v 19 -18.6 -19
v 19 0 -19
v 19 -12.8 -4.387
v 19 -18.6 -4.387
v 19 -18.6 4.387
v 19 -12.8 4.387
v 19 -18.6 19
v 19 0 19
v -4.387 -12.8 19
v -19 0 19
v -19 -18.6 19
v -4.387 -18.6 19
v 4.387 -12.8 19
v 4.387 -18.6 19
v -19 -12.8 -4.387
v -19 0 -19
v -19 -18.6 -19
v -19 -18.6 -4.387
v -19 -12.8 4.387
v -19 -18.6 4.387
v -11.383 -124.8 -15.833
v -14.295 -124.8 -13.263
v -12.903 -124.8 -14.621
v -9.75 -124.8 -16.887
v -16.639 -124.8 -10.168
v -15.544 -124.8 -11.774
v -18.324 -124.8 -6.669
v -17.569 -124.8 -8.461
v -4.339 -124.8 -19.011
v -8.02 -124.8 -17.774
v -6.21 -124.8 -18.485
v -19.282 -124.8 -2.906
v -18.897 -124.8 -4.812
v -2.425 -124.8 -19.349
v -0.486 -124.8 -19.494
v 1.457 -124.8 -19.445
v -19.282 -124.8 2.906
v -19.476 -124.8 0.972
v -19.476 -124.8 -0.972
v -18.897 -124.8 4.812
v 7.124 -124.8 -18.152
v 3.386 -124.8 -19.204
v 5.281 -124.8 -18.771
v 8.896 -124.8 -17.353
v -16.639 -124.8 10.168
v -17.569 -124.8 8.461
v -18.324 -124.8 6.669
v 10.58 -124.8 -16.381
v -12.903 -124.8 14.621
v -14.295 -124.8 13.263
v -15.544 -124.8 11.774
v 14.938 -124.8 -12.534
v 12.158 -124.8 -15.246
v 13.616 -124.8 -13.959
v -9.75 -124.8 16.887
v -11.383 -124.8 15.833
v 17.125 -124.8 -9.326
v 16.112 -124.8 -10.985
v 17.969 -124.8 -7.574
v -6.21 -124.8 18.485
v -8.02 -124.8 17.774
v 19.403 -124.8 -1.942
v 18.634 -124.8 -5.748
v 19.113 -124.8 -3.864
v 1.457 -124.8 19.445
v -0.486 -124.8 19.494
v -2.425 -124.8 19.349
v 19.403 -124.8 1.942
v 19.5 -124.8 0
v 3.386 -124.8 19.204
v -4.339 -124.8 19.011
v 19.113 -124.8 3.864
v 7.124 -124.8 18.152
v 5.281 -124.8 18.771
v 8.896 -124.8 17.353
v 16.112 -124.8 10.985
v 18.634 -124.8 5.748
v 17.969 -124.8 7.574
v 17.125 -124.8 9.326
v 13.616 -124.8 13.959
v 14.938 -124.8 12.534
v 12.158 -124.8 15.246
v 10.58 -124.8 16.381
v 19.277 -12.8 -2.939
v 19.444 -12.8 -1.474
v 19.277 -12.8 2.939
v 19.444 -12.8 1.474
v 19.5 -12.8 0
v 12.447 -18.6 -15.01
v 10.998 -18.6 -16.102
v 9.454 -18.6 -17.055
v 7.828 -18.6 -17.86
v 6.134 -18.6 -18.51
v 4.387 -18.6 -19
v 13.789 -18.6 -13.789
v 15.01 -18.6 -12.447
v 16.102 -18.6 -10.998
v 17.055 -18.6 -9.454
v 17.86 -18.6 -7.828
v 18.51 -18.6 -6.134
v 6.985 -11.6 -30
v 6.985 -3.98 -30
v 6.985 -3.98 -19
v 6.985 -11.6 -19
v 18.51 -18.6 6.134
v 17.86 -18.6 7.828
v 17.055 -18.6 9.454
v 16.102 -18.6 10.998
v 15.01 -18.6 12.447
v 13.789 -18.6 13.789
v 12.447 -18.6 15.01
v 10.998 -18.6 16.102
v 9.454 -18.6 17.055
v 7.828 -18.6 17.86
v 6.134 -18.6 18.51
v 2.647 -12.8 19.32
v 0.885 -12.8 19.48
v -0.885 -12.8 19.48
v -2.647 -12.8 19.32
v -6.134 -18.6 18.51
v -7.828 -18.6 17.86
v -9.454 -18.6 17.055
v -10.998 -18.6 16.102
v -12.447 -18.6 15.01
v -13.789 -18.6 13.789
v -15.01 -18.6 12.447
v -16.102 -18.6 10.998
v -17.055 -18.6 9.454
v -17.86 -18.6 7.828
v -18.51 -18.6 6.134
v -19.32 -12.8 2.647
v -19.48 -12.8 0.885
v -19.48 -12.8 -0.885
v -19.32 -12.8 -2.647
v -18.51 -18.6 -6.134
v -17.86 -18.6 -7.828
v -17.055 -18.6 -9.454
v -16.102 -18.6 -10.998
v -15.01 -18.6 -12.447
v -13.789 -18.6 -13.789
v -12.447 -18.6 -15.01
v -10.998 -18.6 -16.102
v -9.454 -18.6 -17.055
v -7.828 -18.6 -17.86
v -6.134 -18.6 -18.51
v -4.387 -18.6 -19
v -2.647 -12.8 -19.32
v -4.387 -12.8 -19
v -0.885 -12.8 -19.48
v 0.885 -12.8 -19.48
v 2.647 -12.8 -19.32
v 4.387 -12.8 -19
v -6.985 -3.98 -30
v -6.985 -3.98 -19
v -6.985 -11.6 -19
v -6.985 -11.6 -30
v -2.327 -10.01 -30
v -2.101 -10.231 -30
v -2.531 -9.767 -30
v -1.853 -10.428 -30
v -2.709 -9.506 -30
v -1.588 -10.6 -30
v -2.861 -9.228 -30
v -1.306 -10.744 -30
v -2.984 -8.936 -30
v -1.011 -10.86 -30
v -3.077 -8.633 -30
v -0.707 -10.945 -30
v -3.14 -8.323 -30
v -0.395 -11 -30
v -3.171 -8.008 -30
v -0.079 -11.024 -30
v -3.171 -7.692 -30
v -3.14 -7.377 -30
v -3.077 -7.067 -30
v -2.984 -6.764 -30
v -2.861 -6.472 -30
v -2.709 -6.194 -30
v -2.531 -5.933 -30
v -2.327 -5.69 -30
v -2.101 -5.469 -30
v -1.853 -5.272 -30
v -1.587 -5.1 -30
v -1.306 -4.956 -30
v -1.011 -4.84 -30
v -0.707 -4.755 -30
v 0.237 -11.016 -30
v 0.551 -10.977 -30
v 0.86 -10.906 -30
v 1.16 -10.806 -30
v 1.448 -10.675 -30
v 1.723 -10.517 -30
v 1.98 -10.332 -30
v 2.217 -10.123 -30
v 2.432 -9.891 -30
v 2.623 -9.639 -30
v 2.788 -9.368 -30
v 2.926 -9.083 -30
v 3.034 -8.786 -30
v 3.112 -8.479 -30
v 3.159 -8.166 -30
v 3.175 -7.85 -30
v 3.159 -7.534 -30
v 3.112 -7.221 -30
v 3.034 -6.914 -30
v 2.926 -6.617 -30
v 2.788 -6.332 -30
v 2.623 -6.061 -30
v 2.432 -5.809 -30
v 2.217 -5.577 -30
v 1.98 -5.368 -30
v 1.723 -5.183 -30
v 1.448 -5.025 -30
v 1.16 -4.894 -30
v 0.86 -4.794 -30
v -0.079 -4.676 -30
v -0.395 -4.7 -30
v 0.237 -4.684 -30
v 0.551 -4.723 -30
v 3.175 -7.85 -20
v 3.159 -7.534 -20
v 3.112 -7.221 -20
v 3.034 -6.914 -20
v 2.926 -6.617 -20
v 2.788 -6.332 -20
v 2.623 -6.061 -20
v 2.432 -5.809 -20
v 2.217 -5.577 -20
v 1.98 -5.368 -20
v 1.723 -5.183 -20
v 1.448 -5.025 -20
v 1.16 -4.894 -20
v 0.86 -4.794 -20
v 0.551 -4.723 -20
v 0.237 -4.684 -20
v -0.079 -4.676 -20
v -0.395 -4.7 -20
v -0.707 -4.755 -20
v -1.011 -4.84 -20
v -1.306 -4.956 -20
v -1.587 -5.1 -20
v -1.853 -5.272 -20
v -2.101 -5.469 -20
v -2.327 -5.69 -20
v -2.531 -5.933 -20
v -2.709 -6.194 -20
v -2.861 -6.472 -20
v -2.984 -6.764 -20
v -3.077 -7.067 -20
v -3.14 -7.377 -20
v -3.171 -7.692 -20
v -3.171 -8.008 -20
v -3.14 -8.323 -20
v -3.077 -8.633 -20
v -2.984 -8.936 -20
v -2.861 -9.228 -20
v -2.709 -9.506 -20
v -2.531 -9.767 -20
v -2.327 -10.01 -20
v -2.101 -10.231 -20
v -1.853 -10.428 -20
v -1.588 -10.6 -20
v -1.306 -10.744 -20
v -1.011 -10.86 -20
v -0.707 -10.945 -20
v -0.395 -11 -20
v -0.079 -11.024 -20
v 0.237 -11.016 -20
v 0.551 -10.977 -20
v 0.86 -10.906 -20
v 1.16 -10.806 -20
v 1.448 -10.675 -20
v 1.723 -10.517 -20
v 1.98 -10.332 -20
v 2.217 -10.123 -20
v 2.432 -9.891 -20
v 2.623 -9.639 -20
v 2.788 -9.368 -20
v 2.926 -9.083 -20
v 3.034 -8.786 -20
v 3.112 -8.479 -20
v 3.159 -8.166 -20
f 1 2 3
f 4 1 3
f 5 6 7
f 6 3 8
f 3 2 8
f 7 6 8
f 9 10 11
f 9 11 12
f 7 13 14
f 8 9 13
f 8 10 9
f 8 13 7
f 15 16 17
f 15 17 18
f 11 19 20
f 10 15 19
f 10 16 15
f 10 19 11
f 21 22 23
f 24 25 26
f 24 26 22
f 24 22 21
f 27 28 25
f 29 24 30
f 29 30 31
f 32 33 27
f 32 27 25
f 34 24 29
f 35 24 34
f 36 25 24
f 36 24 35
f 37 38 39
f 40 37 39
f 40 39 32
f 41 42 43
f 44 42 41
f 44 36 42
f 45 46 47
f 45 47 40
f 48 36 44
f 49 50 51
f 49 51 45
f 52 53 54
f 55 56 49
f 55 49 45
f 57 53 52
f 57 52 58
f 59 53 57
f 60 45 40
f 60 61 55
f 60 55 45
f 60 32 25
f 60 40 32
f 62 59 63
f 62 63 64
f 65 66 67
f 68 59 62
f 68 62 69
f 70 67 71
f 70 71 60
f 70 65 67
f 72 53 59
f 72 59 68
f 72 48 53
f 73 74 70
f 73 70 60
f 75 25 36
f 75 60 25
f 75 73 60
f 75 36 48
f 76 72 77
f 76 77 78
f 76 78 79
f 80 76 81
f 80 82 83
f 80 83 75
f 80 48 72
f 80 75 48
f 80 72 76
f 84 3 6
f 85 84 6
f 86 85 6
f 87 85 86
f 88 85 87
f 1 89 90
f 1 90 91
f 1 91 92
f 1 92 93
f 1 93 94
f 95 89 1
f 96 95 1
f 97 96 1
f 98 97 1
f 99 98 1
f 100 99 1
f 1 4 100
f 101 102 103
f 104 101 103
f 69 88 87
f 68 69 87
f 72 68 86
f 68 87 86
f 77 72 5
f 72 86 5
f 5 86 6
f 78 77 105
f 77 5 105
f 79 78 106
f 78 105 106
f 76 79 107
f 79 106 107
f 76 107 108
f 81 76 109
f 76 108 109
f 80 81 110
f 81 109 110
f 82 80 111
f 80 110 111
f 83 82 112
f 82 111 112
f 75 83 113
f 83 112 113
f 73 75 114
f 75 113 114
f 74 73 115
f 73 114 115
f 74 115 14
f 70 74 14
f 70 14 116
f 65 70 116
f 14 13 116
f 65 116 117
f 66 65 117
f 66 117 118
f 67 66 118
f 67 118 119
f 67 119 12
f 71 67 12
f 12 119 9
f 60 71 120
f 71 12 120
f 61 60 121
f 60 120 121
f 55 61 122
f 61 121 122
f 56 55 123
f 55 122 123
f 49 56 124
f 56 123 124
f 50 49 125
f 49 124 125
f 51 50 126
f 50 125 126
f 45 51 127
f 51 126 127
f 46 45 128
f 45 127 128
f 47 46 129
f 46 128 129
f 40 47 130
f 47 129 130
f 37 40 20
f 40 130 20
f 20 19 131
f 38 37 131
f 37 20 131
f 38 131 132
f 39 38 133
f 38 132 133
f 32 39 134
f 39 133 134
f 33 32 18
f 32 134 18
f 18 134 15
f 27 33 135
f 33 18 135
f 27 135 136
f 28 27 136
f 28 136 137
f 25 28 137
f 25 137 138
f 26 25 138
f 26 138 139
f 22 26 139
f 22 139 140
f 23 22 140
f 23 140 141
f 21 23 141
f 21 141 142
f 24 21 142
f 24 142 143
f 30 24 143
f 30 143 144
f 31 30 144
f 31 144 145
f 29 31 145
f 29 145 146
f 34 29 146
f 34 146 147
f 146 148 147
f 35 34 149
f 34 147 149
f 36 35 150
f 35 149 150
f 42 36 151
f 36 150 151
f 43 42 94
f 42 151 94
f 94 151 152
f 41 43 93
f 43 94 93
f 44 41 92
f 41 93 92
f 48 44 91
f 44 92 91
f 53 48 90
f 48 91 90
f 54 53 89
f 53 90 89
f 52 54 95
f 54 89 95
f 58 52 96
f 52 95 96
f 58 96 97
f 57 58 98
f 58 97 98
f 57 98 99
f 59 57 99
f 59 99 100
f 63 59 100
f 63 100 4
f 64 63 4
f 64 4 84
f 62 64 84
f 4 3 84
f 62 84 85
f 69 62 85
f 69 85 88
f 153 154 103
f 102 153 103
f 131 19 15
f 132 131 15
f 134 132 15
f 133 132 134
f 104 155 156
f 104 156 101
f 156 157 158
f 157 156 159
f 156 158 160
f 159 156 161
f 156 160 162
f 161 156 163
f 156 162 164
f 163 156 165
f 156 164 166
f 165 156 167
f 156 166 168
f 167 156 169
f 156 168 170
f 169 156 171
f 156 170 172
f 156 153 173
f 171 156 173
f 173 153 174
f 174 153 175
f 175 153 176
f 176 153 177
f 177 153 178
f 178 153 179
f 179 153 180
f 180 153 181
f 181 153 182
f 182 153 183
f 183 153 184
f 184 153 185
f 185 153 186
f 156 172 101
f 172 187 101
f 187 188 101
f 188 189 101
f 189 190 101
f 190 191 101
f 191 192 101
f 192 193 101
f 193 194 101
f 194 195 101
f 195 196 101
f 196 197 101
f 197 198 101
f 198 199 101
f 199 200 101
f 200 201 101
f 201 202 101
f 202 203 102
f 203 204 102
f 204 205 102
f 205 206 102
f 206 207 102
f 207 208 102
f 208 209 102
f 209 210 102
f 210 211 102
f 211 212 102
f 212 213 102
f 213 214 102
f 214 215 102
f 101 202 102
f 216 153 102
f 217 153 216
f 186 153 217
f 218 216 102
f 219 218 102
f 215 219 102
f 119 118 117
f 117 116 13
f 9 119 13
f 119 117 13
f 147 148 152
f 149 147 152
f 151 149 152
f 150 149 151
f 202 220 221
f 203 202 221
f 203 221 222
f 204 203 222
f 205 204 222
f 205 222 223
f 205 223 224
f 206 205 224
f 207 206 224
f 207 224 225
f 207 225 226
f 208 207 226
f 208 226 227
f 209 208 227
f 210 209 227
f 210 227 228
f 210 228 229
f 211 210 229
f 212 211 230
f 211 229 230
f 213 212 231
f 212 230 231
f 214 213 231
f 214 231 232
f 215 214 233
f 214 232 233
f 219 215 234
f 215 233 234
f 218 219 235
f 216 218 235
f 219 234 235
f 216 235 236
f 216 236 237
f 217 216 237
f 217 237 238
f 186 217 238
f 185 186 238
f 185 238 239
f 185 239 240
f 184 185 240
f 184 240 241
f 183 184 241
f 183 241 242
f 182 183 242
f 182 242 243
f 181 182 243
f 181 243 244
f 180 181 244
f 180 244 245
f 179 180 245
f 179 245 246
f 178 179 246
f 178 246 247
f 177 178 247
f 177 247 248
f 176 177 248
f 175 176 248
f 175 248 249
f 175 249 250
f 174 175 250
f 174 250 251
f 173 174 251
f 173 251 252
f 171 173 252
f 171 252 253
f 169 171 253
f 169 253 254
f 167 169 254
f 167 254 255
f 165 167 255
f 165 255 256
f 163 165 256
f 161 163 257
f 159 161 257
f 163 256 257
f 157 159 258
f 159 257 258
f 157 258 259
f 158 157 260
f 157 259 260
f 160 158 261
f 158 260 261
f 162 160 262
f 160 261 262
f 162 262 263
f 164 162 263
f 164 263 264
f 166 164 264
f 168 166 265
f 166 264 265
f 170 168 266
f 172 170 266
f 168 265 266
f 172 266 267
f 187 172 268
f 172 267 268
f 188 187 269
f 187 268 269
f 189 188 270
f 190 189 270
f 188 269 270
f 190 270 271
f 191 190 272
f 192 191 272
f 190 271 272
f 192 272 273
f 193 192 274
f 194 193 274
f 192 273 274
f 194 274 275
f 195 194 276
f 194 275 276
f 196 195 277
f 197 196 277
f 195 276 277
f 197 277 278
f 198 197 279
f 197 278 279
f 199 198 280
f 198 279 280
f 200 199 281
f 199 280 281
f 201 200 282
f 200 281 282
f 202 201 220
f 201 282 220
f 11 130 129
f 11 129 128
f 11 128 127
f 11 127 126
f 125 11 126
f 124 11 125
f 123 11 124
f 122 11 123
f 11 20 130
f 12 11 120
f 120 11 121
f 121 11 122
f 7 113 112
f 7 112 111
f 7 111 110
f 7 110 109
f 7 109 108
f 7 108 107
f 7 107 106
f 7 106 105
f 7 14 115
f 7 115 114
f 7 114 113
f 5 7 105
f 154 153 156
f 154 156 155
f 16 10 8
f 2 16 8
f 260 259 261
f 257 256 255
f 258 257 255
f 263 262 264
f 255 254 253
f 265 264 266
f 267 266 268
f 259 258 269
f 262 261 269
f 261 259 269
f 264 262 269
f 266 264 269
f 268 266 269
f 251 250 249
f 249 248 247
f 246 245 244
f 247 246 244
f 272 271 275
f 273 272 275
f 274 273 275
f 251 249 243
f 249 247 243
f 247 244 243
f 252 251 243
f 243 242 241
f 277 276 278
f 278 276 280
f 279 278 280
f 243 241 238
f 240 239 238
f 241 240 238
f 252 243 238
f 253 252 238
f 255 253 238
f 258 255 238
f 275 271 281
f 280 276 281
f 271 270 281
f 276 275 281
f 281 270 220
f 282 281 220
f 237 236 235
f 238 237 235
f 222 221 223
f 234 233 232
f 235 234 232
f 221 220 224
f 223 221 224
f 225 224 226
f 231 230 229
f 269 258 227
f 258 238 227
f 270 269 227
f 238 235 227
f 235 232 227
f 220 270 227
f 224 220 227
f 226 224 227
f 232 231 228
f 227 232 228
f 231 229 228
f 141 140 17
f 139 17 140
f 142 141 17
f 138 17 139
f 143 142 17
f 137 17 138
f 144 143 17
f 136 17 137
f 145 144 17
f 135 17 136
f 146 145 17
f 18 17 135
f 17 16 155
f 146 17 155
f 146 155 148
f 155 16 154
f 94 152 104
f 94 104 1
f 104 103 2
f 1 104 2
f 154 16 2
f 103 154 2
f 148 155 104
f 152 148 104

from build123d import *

# Parameters (mm, degrees)
SKETCH_W     = 38
SKETCH_H     = 38
PAD_DEPTH    = 18.6
SKETCH001_W  = 13.97
SKETCH001_H  = 12
PAD001_DEPTH = 7.62
SKETCH002_R  = 19.5
PAD002_DEPTH = 112
SKETCH003_R  = 3.175
POCKET_DEPTH = 20


with BuildPart() as part:
    # Sketch → Pad (new body)
    with BuildSketch(Plane.XZ):
        Rectangle(SKETCH_W, SKETCH_H)
    extrude(amount=PAD_DEPTH)

    # Sketch001 → Pad001 (join)
    with BuildSketch(Plane.XZ.offset(3.98)):
        with Locations((0, -24)):
            Rectangle(SKETCH001_W, SKETCH001_H)
    extrude(amount=PAD001_DEPTH)

    # Sketch002 → Pad002 (join)
    with BuildSketch(Plane.XZ.offset(12.8)):
        Circle(SKETCH002_R)
    extrude(amount=PAD002_DEPTH)

    # Sketch003 → Pocket (cut)
    with BuildSketch(Plane.XY.offset(-20)):
        with Locations((0, -7.85)):
            Circle(SKETCH003_R)
    extrude(amount=-POCKET_DEPTH, mode=Mode.SUBTRACT)


solid = part.part
